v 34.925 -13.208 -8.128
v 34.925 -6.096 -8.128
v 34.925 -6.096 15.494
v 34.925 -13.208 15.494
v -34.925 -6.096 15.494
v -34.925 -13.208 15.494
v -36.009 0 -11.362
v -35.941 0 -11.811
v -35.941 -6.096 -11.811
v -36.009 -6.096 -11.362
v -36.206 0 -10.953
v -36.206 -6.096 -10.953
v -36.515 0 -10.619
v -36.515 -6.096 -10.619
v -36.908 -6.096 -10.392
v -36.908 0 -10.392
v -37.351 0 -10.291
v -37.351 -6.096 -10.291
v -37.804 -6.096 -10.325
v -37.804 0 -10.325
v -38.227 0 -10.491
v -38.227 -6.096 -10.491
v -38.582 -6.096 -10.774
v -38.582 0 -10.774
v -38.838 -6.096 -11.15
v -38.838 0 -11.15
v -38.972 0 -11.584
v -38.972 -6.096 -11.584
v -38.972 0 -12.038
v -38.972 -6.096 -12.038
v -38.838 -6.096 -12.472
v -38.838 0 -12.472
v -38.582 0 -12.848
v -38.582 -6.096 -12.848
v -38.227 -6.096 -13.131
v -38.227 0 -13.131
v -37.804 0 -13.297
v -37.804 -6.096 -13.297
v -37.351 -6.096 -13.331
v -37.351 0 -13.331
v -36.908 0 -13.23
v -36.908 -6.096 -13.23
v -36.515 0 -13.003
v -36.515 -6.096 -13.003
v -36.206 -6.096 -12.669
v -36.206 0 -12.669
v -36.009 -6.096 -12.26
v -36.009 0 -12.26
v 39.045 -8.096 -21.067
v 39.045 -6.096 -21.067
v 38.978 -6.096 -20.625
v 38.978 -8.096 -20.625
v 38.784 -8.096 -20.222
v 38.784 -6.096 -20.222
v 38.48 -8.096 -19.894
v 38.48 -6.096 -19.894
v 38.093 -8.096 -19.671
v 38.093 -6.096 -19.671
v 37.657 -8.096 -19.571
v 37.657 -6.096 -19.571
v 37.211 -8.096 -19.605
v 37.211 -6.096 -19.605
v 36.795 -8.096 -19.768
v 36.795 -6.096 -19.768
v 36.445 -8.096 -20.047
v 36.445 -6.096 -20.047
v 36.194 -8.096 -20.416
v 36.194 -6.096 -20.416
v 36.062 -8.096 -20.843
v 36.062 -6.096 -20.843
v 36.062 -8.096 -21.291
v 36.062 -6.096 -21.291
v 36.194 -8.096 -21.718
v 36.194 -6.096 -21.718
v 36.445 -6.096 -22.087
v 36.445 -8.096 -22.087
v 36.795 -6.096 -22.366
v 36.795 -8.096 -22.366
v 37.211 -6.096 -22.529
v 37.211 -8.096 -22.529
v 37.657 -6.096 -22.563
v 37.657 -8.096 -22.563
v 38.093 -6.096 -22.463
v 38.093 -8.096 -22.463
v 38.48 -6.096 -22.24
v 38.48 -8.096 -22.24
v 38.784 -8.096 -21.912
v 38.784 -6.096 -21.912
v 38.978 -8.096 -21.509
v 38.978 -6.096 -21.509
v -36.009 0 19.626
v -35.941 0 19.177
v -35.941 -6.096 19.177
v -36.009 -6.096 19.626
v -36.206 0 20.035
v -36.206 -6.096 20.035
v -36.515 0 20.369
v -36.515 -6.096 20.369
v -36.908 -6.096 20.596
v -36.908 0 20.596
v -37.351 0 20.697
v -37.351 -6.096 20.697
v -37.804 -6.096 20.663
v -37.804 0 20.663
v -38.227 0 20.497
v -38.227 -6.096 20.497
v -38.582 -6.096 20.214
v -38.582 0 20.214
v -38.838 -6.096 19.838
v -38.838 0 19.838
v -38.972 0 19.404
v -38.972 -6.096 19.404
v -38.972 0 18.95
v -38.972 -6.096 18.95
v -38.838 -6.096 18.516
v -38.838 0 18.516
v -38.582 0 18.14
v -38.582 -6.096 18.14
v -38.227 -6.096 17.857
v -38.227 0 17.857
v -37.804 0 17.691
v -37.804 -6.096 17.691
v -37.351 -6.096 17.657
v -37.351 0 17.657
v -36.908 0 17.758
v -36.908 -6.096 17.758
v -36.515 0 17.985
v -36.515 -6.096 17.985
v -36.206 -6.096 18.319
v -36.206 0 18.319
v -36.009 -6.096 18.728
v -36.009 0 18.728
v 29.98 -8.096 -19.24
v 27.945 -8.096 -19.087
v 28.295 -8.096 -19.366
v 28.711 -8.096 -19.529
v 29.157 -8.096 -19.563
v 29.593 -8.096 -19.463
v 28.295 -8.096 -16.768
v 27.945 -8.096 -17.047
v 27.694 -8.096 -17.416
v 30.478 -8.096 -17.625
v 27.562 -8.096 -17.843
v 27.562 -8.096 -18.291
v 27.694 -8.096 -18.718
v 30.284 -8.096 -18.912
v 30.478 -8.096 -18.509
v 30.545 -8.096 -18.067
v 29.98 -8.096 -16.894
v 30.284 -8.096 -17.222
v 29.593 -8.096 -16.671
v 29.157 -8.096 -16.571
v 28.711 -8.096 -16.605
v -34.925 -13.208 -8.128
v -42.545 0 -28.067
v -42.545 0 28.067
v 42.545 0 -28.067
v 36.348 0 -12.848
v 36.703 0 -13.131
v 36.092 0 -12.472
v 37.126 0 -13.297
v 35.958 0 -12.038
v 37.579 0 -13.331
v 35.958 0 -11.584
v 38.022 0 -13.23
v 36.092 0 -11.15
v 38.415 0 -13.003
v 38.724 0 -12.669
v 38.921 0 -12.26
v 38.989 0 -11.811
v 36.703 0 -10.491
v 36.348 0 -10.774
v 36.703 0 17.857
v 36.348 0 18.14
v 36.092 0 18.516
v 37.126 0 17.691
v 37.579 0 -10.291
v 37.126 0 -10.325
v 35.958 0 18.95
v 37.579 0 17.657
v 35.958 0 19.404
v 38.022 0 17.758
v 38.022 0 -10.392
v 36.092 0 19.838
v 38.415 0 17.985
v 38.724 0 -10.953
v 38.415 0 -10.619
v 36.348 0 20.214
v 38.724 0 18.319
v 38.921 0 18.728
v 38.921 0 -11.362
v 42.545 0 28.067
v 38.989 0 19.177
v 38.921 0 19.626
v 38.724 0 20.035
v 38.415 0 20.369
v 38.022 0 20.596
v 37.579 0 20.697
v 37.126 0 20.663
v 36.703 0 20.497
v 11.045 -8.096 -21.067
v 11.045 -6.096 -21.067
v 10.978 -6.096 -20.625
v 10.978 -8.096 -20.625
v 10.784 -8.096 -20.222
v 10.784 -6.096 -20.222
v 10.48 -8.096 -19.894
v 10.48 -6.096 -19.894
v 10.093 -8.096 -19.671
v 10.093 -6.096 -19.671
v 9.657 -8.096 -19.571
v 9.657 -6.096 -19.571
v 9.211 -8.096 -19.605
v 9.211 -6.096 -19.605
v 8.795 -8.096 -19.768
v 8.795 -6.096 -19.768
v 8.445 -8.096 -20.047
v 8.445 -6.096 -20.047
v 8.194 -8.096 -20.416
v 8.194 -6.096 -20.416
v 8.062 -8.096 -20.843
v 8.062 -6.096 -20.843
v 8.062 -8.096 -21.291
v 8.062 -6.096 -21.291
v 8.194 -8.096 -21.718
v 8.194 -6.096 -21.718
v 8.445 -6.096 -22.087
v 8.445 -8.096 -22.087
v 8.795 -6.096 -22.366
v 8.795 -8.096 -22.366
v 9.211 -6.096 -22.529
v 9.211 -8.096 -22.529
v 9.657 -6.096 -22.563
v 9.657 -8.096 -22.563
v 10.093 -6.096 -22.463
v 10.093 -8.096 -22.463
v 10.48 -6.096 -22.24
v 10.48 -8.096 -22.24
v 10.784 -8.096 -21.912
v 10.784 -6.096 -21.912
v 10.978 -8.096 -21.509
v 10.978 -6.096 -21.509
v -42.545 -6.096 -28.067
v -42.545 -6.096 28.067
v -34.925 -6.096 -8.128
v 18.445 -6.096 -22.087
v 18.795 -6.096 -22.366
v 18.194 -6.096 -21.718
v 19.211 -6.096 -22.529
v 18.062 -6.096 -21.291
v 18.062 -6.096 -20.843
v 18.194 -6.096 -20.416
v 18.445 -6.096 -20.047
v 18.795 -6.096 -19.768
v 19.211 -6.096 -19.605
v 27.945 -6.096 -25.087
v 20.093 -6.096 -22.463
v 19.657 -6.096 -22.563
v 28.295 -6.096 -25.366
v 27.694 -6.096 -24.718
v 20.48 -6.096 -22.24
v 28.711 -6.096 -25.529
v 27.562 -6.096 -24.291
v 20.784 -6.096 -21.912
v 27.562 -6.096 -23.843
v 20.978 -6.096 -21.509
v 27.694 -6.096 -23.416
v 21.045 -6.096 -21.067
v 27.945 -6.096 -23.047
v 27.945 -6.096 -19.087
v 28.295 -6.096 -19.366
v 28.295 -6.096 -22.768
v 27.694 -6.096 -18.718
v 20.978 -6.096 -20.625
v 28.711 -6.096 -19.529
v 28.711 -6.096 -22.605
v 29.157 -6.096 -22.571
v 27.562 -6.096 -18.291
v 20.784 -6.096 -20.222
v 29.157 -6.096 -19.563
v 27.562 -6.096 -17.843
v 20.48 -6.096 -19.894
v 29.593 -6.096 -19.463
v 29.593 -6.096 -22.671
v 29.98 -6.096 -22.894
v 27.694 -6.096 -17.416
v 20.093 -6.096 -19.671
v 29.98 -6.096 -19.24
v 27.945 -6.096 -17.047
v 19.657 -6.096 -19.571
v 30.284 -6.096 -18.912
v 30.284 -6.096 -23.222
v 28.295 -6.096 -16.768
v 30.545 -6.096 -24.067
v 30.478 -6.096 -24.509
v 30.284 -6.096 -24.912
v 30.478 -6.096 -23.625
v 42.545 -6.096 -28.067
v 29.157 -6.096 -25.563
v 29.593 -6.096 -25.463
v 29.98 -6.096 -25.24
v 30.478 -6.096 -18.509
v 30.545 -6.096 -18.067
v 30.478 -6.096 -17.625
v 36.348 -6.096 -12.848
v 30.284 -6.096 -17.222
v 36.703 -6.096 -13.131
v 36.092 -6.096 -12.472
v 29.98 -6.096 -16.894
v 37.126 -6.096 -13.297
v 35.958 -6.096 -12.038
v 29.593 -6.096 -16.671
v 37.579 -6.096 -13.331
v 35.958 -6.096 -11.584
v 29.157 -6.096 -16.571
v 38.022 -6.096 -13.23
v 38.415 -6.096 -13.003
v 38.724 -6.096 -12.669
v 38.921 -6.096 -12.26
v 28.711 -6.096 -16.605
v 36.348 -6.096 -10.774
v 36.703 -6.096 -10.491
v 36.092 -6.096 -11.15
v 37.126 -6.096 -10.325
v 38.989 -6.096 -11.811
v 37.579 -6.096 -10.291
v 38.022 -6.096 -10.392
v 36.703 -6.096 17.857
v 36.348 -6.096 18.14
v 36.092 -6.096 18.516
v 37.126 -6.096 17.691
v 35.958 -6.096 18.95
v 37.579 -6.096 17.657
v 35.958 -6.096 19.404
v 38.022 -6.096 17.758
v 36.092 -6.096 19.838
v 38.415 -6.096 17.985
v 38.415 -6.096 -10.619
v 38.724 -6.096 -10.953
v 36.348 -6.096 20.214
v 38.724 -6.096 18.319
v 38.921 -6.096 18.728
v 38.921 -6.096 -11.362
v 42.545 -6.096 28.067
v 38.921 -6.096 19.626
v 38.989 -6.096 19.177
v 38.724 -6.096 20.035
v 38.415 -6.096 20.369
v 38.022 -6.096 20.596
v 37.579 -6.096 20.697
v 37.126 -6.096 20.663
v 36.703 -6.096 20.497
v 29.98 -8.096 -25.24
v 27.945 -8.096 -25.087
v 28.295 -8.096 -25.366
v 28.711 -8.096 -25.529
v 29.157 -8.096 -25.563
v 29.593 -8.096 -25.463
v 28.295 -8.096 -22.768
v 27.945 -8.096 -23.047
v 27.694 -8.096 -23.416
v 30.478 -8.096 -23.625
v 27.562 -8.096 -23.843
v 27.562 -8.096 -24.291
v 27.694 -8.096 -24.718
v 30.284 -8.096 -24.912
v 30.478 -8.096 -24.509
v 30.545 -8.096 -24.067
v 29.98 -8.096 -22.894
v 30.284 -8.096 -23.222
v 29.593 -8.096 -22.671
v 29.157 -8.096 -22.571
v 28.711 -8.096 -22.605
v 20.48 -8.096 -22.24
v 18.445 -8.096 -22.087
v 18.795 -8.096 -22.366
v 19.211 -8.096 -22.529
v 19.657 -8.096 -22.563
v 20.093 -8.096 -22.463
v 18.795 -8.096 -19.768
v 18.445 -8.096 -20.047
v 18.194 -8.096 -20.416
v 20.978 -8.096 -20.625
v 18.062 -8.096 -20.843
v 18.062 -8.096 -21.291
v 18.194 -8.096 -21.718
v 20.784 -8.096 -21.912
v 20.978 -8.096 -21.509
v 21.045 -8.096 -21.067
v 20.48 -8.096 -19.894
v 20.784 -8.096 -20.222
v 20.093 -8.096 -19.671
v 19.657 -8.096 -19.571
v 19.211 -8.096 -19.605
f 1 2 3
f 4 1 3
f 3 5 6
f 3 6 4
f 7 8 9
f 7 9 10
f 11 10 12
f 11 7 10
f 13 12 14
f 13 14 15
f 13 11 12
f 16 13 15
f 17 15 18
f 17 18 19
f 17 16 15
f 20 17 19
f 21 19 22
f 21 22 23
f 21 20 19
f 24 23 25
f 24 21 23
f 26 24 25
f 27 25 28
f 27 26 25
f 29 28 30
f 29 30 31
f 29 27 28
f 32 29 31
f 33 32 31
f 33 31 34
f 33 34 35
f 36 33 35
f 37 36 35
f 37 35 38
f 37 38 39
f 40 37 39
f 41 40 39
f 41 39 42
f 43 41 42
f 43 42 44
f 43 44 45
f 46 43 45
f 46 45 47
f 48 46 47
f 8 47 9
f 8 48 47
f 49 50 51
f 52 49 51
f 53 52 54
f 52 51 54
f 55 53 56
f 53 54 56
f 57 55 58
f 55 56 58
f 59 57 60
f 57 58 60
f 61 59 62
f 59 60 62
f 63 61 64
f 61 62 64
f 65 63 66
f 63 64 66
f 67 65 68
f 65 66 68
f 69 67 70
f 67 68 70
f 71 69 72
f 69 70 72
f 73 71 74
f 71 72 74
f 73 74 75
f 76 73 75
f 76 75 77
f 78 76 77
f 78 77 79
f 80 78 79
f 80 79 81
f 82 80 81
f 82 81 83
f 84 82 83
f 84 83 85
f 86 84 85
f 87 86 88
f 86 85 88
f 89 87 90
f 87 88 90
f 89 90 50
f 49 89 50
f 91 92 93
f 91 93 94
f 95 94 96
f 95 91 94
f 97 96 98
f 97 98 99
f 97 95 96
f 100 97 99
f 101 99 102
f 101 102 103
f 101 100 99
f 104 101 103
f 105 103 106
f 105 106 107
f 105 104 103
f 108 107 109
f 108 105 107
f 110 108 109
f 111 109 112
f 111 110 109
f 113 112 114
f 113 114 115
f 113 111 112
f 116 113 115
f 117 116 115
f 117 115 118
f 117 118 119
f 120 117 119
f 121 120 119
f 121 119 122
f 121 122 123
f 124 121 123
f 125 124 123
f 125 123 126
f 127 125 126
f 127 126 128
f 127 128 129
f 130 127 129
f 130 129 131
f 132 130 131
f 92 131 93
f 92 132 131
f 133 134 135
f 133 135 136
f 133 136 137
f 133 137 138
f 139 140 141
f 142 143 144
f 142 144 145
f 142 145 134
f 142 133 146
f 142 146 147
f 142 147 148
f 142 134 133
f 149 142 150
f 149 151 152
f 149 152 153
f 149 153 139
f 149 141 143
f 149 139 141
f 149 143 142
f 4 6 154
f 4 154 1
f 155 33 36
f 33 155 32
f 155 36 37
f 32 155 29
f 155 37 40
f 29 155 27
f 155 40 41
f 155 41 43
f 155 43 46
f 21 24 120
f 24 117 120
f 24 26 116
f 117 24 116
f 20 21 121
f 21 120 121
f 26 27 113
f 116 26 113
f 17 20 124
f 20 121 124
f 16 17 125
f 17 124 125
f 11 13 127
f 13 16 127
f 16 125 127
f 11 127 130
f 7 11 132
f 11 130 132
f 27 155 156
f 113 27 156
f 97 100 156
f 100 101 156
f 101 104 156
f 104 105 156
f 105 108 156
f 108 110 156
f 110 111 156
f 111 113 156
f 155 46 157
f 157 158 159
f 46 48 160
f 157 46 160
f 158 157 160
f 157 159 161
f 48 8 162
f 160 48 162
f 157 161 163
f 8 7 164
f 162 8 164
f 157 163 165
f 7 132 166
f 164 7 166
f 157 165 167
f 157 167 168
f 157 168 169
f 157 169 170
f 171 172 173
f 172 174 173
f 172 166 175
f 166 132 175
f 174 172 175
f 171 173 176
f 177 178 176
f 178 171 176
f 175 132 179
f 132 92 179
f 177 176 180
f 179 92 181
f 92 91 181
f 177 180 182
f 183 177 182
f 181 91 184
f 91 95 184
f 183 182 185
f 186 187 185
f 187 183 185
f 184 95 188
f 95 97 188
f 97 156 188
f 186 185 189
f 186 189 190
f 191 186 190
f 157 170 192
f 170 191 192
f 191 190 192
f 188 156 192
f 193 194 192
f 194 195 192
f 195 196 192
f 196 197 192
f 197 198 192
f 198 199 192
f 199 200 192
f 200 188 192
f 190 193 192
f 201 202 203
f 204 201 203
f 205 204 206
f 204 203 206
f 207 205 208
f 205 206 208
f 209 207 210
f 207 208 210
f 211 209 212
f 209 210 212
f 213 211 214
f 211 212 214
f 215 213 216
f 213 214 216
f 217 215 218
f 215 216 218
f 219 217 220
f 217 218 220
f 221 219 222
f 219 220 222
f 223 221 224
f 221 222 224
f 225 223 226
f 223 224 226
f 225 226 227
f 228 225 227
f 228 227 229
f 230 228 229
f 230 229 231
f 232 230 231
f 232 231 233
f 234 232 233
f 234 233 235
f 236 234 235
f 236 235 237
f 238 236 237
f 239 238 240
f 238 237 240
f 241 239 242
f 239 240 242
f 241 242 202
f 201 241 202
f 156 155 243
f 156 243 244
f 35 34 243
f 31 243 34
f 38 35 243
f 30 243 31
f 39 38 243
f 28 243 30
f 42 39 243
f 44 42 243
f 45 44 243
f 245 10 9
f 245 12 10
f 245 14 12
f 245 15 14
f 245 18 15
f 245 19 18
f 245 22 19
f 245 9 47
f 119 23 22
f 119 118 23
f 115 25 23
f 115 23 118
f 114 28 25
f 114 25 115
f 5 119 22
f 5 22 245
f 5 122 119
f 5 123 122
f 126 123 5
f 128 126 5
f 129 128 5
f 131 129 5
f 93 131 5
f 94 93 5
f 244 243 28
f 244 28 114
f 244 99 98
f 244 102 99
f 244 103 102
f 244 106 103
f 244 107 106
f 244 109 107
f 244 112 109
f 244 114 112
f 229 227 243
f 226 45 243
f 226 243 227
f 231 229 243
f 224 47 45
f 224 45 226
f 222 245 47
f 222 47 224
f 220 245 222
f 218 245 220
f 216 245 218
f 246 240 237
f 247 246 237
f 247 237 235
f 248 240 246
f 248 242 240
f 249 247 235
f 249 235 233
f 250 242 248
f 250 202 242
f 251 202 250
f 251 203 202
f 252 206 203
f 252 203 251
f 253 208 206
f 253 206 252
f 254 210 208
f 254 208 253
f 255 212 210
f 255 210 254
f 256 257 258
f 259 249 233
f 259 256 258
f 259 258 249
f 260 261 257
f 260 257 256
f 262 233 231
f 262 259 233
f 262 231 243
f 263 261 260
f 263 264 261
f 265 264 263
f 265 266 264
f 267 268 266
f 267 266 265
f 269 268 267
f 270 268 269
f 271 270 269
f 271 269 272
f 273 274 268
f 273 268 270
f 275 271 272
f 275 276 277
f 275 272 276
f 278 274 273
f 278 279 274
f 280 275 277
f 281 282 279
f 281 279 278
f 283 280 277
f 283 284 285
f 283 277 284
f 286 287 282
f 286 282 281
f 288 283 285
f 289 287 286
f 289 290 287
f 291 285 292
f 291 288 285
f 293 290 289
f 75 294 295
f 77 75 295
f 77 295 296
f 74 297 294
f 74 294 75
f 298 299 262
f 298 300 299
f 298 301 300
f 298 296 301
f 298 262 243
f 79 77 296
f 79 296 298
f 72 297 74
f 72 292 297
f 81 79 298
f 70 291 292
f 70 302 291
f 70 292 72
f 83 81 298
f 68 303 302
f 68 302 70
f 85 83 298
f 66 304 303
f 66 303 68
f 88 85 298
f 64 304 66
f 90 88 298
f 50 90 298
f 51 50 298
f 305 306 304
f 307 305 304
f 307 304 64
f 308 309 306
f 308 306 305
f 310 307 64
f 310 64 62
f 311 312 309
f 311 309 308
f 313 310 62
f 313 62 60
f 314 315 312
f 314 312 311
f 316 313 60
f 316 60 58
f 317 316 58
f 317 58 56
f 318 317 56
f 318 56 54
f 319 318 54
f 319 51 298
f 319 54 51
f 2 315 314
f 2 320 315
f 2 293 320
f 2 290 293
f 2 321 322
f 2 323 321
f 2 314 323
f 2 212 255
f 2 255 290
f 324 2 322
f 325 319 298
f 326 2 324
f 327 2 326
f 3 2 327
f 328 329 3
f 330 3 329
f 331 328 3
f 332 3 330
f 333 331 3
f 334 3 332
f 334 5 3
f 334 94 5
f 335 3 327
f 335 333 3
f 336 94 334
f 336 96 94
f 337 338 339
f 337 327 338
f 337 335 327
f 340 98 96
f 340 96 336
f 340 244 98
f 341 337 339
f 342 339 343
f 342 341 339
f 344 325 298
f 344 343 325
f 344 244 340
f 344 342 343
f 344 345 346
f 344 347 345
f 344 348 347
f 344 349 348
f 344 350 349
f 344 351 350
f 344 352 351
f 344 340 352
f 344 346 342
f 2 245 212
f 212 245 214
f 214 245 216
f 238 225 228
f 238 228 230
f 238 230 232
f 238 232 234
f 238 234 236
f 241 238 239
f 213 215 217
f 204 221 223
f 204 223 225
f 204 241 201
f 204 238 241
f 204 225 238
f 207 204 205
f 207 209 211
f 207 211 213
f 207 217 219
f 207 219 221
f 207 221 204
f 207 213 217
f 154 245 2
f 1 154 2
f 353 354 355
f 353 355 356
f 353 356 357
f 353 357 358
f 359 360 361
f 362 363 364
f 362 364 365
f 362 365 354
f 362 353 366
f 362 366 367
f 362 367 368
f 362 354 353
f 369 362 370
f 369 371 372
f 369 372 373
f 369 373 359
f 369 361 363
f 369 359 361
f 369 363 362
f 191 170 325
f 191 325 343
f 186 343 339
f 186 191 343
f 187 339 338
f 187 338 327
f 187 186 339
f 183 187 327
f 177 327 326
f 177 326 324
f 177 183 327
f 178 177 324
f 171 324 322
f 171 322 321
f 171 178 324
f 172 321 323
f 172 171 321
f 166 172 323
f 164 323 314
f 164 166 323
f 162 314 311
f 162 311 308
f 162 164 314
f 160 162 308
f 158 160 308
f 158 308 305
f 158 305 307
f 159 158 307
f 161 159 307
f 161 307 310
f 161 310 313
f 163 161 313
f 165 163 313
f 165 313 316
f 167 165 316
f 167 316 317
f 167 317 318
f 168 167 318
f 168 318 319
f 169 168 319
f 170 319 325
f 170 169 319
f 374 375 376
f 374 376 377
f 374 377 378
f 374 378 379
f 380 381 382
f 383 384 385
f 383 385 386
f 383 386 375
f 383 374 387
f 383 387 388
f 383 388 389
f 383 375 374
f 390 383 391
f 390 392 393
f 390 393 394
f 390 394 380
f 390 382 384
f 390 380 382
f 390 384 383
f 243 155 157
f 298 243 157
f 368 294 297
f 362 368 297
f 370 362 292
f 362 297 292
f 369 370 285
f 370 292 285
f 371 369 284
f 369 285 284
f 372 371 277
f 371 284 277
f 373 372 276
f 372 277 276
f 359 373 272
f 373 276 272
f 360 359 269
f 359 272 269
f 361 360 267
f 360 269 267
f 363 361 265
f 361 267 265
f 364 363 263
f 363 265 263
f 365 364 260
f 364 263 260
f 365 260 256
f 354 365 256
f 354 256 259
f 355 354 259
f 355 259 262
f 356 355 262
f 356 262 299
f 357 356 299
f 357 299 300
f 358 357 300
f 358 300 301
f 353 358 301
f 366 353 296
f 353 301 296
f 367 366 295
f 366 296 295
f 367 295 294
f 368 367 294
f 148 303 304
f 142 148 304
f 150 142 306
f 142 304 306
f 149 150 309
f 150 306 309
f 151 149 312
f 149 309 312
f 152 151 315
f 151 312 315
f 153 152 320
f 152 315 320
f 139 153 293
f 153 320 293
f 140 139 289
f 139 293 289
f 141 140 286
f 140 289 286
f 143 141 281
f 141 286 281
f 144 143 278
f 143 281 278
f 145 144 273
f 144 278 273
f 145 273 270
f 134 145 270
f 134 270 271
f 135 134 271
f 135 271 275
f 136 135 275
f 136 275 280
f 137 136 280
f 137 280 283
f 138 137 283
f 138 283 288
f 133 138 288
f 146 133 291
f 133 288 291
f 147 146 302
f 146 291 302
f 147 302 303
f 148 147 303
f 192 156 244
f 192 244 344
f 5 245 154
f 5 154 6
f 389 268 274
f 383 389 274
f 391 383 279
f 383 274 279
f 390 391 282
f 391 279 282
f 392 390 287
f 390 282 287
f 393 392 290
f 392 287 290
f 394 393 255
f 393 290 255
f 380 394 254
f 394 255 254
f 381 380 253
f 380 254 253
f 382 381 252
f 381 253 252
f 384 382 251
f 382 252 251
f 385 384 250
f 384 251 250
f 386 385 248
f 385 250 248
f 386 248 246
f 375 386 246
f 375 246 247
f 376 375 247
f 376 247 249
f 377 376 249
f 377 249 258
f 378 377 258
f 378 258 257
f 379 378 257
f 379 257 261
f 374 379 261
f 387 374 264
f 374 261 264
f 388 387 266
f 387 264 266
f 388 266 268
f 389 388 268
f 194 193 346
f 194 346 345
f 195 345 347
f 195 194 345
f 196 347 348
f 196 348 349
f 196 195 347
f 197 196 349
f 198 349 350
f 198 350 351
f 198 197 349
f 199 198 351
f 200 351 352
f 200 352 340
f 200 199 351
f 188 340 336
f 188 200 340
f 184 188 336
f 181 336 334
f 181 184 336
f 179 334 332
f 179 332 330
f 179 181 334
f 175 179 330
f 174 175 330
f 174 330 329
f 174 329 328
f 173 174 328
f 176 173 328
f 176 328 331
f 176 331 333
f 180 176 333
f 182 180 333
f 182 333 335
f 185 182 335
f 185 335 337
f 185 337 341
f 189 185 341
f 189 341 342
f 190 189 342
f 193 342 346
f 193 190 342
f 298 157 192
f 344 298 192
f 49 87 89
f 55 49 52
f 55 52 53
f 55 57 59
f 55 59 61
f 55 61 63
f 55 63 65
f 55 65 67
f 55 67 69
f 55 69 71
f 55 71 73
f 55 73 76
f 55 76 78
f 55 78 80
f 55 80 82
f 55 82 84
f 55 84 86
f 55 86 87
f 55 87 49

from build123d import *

# Parameters (mm, degrees)
F0_W     = 85.09
F0_H     = 56.134
F0_R     = 1.524
F1_DEPTH = 6.096
F2_W     = 69.85
F2_H     = 23.622
F3_DEPTH = 7.112
F4_R     = 1.5
F5_DEPTH = 2


with BuildPart() as f1:
    # F0 (on Front) → F1 (new body)
    with BuildSketch(Plane.XZ):
        Rectangle(F0_W, F0_H)
        with Locations((-37.465, -11.811)):
            Circle(F0_R, mode=Mode.SUBTRACT)
        with Locations((37.465, -11.811)):
            Circle(F0_R, mode=Mode.SUBTRACT)
        with Locations((-37.465, 19.177)):
            Circle(F0_R, mode=Mode.SUBTRACT)
        with Locations((37.465, 19.177)):
            Circle(F0_R, mode=Mode.SUBTRACT)
    extrude(amount=F1_DEPTH)

    # F2 (on face) → F3 (join)
    with BuildSketch(Plane.XZ.offset(6.096)):
        with Locations((0, 3.683)):
            Rectangle(F2_W, F2_H)
    extrude(amount=F3_DEPTH)

    # F4 (on face) → F5 (join)
    with BuildSketch(Plane.XZ.offset(6.096)):
        with Locations((9.545, -21.067)):
            Circle(F4_R)
        with Locations((19.545, -21.067)):
            Circle(F4_R)
        with Locations((29.045, -24.067)):
            Circle(F4_R)
        with Locations((29.045, -18.067)):
            Circle(F4_R)
        with Locations((37.545, -21.067)):
            Circle(F4_R)
    extrude(amount=F5_DEPTH)


solid = f1.part
